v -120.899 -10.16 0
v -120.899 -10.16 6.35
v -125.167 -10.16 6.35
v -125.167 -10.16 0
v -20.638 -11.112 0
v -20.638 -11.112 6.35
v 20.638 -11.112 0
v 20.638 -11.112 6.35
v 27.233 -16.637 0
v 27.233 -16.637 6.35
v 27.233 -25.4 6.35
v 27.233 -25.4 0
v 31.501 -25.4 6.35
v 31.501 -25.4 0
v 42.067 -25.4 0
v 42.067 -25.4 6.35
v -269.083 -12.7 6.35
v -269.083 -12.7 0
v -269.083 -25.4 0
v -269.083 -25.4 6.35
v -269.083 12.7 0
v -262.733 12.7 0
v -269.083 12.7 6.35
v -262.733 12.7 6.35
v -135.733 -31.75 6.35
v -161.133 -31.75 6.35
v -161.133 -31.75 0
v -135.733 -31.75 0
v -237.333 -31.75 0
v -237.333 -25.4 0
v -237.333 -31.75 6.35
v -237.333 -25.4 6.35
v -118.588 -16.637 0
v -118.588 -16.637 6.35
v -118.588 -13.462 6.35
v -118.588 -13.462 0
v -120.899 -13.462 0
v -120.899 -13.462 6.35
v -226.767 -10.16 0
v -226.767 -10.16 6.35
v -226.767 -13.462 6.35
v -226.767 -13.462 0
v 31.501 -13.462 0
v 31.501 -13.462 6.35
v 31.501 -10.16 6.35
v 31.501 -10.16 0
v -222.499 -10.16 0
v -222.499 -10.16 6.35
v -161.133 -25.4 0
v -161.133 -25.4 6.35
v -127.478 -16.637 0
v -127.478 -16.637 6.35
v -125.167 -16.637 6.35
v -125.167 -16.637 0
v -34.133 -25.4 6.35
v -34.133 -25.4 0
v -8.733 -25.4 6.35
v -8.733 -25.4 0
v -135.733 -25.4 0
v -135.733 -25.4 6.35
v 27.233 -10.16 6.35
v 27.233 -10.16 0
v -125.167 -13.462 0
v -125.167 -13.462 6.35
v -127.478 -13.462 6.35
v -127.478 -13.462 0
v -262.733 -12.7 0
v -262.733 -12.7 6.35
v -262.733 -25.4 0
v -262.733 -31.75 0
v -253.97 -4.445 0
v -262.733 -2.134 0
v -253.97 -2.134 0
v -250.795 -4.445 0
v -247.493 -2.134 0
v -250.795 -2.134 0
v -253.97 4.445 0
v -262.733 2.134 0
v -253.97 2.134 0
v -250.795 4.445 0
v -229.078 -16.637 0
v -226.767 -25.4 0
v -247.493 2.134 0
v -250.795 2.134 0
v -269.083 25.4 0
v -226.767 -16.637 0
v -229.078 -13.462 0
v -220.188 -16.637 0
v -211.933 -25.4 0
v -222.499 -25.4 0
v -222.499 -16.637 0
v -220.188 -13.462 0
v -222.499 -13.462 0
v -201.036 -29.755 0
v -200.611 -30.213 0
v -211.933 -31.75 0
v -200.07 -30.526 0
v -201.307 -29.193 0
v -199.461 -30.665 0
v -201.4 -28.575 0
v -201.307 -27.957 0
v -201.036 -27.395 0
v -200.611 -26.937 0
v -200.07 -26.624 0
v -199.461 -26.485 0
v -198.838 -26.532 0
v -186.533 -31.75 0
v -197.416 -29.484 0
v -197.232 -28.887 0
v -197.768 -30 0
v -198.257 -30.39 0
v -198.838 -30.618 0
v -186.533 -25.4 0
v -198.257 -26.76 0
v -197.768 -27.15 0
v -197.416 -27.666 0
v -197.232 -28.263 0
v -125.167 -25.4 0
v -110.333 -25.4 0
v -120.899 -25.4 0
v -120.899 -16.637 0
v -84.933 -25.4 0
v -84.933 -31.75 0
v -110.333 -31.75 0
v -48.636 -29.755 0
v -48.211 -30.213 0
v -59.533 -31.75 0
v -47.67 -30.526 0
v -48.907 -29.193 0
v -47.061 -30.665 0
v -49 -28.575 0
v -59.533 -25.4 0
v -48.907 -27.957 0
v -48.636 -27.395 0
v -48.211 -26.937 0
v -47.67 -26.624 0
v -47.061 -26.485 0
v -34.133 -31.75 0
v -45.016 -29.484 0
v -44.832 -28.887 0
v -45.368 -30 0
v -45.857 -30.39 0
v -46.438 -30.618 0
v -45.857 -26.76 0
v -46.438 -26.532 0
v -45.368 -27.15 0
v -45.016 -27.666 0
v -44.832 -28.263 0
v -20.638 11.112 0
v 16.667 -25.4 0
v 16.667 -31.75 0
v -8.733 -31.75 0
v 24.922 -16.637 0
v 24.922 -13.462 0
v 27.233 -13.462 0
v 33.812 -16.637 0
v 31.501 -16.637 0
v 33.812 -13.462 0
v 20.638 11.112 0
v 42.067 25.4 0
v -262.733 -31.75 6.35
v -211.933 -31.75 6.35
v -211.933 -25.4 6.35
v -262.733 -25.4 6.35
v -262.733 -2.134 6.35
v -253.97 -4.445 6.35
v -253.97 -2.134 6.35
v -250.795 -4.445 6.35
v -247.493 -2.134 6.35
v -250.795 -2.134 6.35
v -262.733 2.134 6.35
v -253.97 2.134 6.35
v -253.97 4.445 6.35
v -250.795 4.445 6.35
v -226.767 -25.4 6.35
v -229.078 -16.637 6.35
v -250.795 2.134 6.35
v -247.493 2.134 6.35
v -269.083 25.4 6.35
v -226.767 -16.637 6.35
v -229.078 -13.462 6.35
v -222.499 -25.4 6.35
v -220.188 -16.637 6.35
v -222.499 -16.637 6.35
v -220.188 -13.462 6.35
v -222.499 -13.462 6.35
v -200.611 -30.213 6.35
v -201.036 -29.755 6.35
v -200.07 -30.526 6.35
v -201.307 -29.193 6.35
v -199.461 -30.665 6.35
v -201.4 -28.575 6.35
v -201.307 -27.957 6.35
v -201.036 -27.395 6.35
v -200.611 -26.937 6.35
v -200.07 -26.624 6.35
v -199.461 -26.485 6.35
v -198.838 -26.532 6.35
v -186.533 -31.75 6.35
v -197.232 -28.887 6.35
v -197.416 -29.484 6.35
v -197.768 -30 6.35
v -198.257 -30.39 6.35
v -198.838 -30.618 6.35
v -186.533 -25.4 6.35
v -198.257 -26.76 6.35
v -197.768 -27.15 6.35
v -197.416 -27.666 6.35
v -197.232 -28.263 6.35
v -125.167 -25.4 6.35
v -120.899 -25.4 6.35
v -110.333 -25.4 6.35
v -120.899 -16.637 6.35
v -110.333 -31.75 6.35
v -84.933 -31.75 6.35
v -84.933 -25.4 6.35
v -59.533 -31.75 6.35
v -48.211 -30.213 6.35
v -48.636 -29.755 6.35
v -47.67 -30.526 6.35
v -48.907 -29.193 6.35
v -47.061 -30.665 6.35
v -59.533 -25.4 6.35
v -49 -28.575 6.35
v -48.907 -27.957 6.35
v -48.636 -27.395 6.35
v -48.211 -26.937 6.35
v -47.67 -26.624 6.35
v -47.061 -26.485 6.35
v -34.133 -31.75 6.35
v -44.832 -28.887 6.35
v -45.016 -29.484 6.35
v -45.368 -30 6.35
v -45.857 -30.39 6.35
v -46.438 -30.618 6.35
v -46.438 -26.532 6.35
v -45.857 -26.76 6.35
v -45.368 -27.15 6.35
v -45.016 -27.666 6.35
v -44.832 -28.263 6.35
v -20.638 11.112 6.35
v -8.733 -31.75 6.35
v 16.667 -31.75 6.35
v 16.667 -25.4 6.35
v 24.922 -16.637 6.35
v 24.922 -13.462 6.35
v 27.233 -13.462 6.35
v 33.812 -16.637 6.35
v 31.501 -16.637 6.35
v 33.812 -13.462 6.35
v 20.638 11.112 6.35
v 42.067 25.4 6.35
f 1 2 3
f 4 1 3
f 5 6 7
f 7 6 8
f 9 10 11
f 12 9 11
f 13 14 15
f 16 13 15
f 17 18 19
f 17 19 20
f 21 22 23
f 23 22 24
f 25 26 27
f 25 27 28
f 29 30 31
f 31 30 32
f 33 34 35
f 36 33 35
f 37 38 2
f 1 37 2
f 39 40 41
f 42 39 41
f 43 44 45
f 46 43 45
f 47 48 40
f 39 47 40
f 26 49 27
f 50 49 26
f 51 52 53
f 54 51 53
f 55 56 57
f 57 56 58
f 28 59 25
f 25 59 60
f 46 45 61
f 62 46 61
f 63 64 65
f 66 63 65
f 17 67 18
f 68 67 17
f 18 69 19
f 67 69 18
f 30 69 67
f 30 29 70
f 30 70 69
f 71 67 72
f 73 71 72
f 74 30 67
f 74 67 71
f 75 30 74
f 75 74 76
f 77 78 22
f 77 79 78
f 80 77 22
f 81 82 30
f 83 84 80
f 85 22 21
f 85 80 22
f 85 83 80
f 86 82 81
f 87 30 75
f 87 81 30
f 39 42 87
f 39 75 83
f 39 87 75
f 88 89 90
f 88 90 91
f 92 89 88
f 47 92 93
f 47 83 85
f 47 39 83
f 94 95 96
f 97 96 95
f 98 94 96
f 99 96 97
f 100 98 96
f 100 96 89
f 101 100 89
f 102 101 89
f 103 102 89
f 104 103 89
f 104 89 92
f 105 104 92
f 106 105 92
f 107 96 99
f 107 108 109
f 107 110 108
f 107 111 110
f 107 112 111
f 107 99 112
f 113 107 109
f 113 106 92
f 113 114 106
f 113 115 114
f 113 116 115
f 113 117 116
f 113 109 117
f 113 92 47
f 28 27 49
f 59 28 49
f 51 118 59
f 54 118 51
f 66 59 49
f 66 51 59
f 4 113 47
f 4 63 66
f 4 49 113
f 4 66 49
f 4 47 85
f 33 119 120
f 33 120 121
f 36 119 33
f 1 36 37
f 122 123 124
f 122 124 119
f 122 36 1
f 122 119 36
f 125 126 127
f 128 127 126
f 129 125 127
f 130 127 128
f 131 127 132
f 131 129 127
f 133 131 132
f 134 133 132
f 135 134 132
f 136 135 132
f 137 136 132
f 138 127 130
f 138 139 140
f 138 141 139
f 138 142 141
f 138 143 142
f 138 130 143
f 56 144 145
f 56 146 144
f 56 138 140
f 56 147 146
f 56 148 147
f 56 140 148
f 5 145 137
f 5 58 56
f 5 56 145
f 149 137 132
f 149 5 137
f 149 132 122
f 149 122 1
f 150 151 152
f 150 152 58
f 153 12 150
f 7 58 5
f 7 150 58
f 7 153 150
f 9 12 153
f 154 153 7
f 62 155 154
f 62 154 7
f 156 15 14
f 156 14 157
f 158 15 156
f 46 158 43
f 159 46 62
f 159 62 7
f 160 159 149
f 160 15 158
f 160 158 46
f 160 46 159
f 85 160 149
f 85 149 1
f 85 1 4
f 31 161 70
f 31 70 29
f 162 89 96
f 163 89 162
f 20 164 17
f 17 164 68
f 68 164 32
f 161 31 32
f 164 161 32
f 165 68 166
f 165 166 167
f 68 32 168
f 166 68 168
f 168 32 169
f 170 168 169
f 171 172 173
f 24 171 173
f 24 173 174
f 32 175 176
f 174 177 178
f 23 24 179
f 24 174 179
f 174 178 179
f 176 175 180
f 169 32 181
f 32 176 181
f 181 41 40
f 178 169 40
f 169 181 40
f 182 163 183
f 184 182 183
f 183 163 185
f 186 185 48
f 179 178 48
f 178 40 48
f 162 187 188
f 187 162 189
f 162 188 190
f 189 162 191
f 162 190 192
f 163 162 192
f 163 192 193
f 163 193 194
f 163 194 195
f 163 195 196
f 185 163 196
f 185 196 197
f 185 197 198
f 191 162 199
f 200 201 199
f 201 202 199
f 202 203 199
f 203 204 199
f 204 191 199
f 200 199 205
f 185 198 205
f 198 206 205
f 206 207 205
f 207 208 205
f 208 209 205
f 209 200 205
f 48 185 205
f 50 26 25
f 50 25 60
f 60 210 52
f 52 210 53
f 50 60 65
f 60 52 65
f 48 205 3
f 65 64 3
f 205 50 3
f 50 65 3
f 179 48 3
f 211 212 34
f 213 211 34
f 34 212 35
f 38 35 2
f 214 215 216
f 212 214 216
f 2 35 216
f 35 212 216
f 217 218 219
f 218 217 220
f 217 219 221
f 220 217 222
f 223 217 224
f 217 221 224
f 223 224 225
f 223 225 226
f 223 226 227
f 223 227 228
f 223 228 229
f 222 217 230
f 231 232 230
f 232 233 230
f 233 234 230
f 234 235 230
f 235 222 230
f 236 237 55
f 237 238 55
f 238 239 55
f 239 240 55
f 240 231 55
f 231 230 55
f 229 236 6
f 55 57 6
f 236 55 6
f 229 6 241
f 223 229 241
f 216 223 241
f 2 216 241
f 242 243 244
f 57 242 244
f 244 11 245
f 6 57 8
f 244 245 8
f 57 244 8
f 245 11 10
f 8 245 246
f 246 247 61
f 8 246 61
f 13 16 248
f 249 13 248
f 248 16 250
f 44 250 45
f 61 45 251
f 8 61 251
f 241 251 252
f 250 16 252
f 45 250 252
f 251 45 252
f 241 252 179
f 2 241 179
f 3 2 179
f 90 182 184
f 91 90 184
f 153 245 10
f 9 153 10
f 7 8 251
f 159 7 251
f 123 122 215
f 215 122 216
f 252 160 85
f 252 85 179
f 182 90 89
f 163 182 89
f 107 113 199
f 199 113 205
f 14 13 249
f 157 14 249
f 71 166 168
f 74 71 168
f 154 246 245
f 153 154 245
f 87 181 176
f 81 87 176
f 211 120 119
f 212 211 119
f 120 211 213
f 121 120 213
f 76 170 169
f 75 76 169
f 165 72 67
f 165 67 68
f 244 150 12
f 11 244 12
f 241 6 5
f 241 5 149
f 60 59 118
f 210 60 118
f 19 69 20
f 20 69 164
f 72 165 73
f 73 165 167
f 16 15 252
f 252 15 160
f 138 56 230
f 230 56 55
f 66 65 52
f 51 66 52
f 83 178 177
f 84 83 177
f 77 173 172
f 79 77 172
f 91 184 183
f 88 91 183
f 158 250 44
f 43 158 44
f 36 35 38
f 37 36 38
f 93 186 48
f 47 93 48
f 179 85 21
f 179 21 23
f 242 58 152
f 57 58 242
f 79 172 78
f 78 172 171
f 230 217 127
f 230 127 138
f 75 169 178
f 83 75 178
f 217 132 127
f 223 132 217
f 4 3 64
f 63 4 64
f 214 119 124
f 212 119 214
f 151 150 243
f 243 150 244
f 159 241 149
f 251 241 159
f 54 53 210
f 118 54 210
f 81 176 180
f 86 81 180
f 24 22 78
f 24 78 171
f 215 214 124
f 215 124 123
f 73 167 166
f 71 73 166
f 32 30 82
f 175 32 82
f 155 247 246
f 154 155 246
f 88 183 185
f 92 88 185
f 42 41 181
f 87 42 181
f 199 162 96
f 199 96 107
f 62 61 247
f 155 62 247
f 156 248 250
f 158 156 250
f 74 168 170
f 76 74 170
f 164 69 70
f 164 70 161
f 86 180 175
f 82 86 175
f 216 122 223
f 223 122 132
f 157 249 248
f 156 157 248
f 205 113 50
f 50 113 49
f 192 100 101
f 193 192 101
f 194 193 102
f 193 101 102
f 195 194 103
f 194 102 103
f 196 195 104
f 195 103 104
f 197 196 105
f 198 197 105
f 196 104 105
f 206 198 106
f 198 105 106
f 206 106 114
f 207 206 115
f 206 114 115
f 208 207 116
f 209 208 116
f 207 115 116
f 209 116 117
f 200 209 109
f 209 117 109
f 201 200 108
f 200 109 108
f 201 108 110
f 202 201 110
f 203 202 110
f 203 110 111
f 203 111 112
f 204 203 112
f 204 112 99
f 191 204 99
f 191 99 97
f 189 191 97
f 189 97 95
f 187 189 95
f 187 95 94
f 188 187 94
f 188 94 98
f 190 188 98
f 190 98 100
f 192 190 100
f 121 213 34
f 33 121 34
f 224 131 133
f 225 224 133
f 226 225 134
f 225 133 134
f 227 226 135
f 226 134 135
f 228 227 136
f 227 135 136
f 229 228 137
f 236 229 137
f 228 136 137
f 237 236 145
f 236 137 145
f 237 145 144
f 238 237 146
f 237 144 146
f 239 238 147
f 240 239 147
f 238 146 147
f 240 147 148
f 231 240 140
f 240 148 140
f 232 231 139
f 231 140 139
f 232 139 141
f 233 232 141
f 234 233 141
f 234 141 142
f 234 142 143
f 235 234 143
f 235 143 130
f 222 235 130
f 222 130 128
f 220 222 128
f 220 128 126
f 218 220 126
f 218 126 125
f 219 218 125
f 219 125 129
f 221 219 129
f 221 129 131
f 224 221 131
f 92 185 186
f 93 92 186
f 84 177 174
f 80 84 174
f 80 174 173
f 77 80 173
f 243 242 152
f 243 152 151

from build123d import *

# Parameters (mm, degrees)
SKETCH1_W           = 304.8
SKETCH1_H           = 50.8
BOSS_EXTRUDE1_DEPTH = 6.35
SKETCH2_W           = 41.275
SKETCH2_H           = 22.225
CUT_EXTRUDE1_DEPTH  = 265.034300402
SKETCH5_W           = 25.4
SKETCH5_H           = 6.35
BOSS_EXTRUDE2_DEPTH = 6.35
LPATTERN1_COUNT     = 6
LPATTERN1_PITCH     = 50.8
SKETCH6_W           = 6.35
SKETCH6_H           = 12.7
BOSS_EXTRUDE3_DEPTH = 6.35
LPATTERN2_COUNT     = 2
LPATTERN2_PITCH     = 38.1
CUT_EXTRUDE2_DEPTH  = 272.024068837
CUT_EXTRUDE3_DEPTH  = 272.024068837
SKETCH9_R           = 2.0955
CUT_EXTRUDE4_DEPTH  = 272.024068837


with BuildPart() as part:
    # Sketch1 → Boss-Extrude1 (new body)
    with BuildSketch(Plane.XY):
        with Locations((-110.333, 0)):
            Rectangle(SKETCH1_W, SKETCH1_H)
    extrude(amount=BOSS_EXTRUDE1_DEPTH)

    # Sketch2 → Cut-Extrude1 (cut, through all)
    with BuildSketch(Plane.XY.offset(6.35)):
        Rectangle(SKETCH2_W, SKETCH2_H)
    extrude(amount=-CUT_EXTRUDE1_DEPTH, mode=Mode.SUBTRACT)

    # Sketch5 → Boss-Extrude2 (add)
    with BuildSketch(Plane.XZ.offset(25.4)):
        with Locations((3.967, 3.175)):
            Rectangle(SKETCH5_W, SKETCH5_H)
    boss_extrude2 = extrude(amount=BOSS_EXTRUDE2_DEPTH)

    # LPattern1: Boss-Extrude2 ×6
    with Locations(*[(-i * LPATTERN1_PITCH, 0, 0) for i in range(1, LPATTERN1_COUNT)]):
        add(boss_extrude2)

    # Sketch6 → Boss-Extrude3 (add)
    with BuildSketch(Plane.ZY.offset(262.733)):
        with Locations((3.175, 19.05)):
            Rectangle(SKETCH6_W, SKETCH6_H)
    boss_extrude3 = extrude(amount=BOSS_EXTRUDE3_DEPTH)

    # LPattern2: Boss-Extrude3 ×2
    with Locations(*[(0, -i * LPATTERN2_PITCH, 0) for i in range(1, LPATTERN2_COUNT)]):
        add(boss_extrude3)

    # Sketch7 → Cut-Extrude2 (cut, through all)
    with BuildSketch(Plane.XY.offset(6.35)):
        Polygon((-262.733, 2.1336), (-262.733, -2.1336), (-253.97, -2.1336), (-253.97, -4.445), (-250.795, -4.445), (-250.795, -2.1336), (-247.493, -2.1336), (-247.493, 2.1336), (-250.795, 2.1336), (-250.795, 4.445), (-253.97, 4.445), (-253.97, 2.1336), align=None)
    extrude(amount=-CUT_EXTRUDE2_DEPTH, mode=Mode.SUBTRACT)

    # Sketch8 → Cut-Extrude3 (cut, through all)
    with BuildSketch(Plane.XY.offset(6.35)):
        Polygon((-226.7666, -25.4), (-222.4994, -25.4), (-222.4994, -16.637), (-220.188, -16.637), (-220.188, -13.462), (-222.4994, -13.462), (-222.4994, -10.16), (-226.7666, -10.16), (-226.7666, -13.462), (-229.078, -13.462), (-229.078, -16.637), (-226.7666, -16.637), align=None)
        Polygon((-125.1666, -25.4), (-120.8994, -25.4), (-120.8994, -16.637), (-118.588, -16.637), (-118.588, -13.462), (-120.8994, -13.462), (-120.8994, -10.16), (-125.1666, -10.16), (-125.1666, -13.462), (-127.478, -13.462), (-127.478, -16.637), (-125.1666, -16.637), align=None)
        Polygon((27.2334, -25.4), (31.5006, -25.4), (31.5006, -16.637), (33.812, -16.637), (33.812, -13.462), (31.5006, -13.462), (31.5006, -10.16), (27.2334, -10.16), (27.2334, -13.462), (24.922, -13.462), (24.922, -16.637), (27.2334, -16.637), align=None)
    extrude(amount=-CUT_EXTRUDE3_DEPTH, mode=Mode.SUBTRACT)

    # Sketch9 → Cut-Extrude4 (cut, through all)
    with BuildSketch(Plane(origin=(0, 0, 0), x_dir=(-1, 0, 0), z_dir=(0, 0, -1))):
        with Locations((46.904309807, -28.575)):
            Circle(SKETCH9_R)
        with Locations((199.304309807, -28.575)):
            Circle(SKETCH9_R)
    extrude(amount=-CUT_EXTRUDE4_DEPTH, mode=Mode.SUBTRACT)


solid = part.part
